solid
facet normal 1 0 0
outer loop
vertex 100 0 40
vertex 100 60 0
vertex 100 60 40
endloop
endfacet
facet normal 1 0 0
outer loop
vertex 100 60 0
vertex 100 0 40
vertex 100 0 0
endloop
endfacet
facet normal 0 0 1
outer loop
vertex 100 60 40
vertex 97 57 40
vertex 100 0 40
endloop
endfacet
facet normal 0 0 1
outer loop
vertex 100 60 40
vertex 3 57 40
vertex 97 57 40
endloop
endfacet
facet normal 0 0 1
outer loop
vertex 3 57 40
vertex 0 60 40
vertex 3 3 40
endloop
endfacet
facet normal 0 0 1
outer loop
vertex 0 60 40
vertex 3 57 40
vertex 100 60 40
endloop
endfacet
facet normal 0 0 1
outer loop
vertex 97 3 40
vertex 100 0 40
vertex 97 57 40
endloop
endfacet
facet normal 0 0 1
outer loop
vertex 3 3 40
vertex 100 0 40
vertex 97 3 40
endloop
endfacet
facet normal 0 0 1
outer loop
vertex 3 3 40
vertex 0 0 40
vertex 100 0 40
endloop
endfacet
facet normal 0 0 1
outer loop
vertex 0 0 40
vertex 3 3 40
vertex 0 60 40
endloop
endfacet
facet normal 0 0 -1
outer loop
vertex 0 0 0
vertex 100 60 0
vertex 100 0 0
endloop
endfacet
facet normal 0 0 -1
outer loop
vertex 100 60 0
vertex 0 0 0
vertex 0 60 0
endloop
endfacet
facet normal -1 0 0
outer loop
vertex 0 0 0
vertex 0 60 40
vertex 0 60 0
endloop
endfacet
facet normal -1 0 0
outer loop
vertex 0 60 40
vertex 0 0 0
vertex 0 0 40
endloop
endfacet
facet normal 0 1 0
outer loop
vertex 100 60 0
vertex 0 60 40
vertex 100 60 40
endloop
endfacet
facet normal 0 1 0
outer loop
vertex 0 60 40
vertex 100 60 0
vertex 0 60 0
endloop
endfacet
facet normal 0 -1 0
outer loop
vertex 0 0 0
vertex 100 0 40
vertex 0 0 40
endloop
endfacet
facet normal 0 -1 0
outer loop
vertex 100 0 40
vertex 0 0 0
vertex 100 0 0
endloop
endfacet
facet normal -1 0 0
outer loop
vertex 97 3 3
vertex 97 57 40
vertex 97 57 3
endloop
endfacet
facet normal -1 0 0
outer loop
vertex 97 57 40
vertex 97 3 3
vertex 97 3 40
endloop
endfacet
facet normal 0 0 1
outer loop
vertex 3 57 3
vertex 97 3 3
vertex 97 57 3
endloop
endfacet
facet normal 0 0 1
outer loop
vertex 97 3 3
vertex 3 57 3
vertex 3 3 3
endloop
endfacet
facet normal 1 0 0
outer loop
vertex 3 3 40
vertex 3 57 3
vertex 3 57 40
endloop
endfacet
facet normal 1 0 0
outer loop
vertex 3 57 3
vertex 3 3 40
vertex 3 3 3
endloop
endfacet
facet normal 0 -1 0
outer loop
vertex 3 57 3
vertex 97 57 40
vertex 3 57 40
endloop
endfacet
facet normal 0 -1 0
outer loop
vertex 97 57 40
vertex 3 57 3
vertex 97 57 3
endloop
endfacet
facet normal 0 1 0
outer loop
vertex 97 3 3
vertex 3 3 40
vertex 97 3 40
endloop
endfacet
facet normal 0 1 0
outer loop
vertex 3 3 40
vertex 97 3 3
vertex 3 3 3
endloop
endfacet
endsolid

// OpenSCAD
module caja(ancho, alto, profundidad, grosor) {
    let(interno = [ancho - 2*grosor, alto - 2*grosor, profundidad - grosor]) {
        difference() {
            cube([ancho, alto, profundidad]);
            translate([grosor, grosor, grosor]) cube(interno);
        }
    }
}

// Prueba con diferentes valores
caja(100, 60, 40, 3);
